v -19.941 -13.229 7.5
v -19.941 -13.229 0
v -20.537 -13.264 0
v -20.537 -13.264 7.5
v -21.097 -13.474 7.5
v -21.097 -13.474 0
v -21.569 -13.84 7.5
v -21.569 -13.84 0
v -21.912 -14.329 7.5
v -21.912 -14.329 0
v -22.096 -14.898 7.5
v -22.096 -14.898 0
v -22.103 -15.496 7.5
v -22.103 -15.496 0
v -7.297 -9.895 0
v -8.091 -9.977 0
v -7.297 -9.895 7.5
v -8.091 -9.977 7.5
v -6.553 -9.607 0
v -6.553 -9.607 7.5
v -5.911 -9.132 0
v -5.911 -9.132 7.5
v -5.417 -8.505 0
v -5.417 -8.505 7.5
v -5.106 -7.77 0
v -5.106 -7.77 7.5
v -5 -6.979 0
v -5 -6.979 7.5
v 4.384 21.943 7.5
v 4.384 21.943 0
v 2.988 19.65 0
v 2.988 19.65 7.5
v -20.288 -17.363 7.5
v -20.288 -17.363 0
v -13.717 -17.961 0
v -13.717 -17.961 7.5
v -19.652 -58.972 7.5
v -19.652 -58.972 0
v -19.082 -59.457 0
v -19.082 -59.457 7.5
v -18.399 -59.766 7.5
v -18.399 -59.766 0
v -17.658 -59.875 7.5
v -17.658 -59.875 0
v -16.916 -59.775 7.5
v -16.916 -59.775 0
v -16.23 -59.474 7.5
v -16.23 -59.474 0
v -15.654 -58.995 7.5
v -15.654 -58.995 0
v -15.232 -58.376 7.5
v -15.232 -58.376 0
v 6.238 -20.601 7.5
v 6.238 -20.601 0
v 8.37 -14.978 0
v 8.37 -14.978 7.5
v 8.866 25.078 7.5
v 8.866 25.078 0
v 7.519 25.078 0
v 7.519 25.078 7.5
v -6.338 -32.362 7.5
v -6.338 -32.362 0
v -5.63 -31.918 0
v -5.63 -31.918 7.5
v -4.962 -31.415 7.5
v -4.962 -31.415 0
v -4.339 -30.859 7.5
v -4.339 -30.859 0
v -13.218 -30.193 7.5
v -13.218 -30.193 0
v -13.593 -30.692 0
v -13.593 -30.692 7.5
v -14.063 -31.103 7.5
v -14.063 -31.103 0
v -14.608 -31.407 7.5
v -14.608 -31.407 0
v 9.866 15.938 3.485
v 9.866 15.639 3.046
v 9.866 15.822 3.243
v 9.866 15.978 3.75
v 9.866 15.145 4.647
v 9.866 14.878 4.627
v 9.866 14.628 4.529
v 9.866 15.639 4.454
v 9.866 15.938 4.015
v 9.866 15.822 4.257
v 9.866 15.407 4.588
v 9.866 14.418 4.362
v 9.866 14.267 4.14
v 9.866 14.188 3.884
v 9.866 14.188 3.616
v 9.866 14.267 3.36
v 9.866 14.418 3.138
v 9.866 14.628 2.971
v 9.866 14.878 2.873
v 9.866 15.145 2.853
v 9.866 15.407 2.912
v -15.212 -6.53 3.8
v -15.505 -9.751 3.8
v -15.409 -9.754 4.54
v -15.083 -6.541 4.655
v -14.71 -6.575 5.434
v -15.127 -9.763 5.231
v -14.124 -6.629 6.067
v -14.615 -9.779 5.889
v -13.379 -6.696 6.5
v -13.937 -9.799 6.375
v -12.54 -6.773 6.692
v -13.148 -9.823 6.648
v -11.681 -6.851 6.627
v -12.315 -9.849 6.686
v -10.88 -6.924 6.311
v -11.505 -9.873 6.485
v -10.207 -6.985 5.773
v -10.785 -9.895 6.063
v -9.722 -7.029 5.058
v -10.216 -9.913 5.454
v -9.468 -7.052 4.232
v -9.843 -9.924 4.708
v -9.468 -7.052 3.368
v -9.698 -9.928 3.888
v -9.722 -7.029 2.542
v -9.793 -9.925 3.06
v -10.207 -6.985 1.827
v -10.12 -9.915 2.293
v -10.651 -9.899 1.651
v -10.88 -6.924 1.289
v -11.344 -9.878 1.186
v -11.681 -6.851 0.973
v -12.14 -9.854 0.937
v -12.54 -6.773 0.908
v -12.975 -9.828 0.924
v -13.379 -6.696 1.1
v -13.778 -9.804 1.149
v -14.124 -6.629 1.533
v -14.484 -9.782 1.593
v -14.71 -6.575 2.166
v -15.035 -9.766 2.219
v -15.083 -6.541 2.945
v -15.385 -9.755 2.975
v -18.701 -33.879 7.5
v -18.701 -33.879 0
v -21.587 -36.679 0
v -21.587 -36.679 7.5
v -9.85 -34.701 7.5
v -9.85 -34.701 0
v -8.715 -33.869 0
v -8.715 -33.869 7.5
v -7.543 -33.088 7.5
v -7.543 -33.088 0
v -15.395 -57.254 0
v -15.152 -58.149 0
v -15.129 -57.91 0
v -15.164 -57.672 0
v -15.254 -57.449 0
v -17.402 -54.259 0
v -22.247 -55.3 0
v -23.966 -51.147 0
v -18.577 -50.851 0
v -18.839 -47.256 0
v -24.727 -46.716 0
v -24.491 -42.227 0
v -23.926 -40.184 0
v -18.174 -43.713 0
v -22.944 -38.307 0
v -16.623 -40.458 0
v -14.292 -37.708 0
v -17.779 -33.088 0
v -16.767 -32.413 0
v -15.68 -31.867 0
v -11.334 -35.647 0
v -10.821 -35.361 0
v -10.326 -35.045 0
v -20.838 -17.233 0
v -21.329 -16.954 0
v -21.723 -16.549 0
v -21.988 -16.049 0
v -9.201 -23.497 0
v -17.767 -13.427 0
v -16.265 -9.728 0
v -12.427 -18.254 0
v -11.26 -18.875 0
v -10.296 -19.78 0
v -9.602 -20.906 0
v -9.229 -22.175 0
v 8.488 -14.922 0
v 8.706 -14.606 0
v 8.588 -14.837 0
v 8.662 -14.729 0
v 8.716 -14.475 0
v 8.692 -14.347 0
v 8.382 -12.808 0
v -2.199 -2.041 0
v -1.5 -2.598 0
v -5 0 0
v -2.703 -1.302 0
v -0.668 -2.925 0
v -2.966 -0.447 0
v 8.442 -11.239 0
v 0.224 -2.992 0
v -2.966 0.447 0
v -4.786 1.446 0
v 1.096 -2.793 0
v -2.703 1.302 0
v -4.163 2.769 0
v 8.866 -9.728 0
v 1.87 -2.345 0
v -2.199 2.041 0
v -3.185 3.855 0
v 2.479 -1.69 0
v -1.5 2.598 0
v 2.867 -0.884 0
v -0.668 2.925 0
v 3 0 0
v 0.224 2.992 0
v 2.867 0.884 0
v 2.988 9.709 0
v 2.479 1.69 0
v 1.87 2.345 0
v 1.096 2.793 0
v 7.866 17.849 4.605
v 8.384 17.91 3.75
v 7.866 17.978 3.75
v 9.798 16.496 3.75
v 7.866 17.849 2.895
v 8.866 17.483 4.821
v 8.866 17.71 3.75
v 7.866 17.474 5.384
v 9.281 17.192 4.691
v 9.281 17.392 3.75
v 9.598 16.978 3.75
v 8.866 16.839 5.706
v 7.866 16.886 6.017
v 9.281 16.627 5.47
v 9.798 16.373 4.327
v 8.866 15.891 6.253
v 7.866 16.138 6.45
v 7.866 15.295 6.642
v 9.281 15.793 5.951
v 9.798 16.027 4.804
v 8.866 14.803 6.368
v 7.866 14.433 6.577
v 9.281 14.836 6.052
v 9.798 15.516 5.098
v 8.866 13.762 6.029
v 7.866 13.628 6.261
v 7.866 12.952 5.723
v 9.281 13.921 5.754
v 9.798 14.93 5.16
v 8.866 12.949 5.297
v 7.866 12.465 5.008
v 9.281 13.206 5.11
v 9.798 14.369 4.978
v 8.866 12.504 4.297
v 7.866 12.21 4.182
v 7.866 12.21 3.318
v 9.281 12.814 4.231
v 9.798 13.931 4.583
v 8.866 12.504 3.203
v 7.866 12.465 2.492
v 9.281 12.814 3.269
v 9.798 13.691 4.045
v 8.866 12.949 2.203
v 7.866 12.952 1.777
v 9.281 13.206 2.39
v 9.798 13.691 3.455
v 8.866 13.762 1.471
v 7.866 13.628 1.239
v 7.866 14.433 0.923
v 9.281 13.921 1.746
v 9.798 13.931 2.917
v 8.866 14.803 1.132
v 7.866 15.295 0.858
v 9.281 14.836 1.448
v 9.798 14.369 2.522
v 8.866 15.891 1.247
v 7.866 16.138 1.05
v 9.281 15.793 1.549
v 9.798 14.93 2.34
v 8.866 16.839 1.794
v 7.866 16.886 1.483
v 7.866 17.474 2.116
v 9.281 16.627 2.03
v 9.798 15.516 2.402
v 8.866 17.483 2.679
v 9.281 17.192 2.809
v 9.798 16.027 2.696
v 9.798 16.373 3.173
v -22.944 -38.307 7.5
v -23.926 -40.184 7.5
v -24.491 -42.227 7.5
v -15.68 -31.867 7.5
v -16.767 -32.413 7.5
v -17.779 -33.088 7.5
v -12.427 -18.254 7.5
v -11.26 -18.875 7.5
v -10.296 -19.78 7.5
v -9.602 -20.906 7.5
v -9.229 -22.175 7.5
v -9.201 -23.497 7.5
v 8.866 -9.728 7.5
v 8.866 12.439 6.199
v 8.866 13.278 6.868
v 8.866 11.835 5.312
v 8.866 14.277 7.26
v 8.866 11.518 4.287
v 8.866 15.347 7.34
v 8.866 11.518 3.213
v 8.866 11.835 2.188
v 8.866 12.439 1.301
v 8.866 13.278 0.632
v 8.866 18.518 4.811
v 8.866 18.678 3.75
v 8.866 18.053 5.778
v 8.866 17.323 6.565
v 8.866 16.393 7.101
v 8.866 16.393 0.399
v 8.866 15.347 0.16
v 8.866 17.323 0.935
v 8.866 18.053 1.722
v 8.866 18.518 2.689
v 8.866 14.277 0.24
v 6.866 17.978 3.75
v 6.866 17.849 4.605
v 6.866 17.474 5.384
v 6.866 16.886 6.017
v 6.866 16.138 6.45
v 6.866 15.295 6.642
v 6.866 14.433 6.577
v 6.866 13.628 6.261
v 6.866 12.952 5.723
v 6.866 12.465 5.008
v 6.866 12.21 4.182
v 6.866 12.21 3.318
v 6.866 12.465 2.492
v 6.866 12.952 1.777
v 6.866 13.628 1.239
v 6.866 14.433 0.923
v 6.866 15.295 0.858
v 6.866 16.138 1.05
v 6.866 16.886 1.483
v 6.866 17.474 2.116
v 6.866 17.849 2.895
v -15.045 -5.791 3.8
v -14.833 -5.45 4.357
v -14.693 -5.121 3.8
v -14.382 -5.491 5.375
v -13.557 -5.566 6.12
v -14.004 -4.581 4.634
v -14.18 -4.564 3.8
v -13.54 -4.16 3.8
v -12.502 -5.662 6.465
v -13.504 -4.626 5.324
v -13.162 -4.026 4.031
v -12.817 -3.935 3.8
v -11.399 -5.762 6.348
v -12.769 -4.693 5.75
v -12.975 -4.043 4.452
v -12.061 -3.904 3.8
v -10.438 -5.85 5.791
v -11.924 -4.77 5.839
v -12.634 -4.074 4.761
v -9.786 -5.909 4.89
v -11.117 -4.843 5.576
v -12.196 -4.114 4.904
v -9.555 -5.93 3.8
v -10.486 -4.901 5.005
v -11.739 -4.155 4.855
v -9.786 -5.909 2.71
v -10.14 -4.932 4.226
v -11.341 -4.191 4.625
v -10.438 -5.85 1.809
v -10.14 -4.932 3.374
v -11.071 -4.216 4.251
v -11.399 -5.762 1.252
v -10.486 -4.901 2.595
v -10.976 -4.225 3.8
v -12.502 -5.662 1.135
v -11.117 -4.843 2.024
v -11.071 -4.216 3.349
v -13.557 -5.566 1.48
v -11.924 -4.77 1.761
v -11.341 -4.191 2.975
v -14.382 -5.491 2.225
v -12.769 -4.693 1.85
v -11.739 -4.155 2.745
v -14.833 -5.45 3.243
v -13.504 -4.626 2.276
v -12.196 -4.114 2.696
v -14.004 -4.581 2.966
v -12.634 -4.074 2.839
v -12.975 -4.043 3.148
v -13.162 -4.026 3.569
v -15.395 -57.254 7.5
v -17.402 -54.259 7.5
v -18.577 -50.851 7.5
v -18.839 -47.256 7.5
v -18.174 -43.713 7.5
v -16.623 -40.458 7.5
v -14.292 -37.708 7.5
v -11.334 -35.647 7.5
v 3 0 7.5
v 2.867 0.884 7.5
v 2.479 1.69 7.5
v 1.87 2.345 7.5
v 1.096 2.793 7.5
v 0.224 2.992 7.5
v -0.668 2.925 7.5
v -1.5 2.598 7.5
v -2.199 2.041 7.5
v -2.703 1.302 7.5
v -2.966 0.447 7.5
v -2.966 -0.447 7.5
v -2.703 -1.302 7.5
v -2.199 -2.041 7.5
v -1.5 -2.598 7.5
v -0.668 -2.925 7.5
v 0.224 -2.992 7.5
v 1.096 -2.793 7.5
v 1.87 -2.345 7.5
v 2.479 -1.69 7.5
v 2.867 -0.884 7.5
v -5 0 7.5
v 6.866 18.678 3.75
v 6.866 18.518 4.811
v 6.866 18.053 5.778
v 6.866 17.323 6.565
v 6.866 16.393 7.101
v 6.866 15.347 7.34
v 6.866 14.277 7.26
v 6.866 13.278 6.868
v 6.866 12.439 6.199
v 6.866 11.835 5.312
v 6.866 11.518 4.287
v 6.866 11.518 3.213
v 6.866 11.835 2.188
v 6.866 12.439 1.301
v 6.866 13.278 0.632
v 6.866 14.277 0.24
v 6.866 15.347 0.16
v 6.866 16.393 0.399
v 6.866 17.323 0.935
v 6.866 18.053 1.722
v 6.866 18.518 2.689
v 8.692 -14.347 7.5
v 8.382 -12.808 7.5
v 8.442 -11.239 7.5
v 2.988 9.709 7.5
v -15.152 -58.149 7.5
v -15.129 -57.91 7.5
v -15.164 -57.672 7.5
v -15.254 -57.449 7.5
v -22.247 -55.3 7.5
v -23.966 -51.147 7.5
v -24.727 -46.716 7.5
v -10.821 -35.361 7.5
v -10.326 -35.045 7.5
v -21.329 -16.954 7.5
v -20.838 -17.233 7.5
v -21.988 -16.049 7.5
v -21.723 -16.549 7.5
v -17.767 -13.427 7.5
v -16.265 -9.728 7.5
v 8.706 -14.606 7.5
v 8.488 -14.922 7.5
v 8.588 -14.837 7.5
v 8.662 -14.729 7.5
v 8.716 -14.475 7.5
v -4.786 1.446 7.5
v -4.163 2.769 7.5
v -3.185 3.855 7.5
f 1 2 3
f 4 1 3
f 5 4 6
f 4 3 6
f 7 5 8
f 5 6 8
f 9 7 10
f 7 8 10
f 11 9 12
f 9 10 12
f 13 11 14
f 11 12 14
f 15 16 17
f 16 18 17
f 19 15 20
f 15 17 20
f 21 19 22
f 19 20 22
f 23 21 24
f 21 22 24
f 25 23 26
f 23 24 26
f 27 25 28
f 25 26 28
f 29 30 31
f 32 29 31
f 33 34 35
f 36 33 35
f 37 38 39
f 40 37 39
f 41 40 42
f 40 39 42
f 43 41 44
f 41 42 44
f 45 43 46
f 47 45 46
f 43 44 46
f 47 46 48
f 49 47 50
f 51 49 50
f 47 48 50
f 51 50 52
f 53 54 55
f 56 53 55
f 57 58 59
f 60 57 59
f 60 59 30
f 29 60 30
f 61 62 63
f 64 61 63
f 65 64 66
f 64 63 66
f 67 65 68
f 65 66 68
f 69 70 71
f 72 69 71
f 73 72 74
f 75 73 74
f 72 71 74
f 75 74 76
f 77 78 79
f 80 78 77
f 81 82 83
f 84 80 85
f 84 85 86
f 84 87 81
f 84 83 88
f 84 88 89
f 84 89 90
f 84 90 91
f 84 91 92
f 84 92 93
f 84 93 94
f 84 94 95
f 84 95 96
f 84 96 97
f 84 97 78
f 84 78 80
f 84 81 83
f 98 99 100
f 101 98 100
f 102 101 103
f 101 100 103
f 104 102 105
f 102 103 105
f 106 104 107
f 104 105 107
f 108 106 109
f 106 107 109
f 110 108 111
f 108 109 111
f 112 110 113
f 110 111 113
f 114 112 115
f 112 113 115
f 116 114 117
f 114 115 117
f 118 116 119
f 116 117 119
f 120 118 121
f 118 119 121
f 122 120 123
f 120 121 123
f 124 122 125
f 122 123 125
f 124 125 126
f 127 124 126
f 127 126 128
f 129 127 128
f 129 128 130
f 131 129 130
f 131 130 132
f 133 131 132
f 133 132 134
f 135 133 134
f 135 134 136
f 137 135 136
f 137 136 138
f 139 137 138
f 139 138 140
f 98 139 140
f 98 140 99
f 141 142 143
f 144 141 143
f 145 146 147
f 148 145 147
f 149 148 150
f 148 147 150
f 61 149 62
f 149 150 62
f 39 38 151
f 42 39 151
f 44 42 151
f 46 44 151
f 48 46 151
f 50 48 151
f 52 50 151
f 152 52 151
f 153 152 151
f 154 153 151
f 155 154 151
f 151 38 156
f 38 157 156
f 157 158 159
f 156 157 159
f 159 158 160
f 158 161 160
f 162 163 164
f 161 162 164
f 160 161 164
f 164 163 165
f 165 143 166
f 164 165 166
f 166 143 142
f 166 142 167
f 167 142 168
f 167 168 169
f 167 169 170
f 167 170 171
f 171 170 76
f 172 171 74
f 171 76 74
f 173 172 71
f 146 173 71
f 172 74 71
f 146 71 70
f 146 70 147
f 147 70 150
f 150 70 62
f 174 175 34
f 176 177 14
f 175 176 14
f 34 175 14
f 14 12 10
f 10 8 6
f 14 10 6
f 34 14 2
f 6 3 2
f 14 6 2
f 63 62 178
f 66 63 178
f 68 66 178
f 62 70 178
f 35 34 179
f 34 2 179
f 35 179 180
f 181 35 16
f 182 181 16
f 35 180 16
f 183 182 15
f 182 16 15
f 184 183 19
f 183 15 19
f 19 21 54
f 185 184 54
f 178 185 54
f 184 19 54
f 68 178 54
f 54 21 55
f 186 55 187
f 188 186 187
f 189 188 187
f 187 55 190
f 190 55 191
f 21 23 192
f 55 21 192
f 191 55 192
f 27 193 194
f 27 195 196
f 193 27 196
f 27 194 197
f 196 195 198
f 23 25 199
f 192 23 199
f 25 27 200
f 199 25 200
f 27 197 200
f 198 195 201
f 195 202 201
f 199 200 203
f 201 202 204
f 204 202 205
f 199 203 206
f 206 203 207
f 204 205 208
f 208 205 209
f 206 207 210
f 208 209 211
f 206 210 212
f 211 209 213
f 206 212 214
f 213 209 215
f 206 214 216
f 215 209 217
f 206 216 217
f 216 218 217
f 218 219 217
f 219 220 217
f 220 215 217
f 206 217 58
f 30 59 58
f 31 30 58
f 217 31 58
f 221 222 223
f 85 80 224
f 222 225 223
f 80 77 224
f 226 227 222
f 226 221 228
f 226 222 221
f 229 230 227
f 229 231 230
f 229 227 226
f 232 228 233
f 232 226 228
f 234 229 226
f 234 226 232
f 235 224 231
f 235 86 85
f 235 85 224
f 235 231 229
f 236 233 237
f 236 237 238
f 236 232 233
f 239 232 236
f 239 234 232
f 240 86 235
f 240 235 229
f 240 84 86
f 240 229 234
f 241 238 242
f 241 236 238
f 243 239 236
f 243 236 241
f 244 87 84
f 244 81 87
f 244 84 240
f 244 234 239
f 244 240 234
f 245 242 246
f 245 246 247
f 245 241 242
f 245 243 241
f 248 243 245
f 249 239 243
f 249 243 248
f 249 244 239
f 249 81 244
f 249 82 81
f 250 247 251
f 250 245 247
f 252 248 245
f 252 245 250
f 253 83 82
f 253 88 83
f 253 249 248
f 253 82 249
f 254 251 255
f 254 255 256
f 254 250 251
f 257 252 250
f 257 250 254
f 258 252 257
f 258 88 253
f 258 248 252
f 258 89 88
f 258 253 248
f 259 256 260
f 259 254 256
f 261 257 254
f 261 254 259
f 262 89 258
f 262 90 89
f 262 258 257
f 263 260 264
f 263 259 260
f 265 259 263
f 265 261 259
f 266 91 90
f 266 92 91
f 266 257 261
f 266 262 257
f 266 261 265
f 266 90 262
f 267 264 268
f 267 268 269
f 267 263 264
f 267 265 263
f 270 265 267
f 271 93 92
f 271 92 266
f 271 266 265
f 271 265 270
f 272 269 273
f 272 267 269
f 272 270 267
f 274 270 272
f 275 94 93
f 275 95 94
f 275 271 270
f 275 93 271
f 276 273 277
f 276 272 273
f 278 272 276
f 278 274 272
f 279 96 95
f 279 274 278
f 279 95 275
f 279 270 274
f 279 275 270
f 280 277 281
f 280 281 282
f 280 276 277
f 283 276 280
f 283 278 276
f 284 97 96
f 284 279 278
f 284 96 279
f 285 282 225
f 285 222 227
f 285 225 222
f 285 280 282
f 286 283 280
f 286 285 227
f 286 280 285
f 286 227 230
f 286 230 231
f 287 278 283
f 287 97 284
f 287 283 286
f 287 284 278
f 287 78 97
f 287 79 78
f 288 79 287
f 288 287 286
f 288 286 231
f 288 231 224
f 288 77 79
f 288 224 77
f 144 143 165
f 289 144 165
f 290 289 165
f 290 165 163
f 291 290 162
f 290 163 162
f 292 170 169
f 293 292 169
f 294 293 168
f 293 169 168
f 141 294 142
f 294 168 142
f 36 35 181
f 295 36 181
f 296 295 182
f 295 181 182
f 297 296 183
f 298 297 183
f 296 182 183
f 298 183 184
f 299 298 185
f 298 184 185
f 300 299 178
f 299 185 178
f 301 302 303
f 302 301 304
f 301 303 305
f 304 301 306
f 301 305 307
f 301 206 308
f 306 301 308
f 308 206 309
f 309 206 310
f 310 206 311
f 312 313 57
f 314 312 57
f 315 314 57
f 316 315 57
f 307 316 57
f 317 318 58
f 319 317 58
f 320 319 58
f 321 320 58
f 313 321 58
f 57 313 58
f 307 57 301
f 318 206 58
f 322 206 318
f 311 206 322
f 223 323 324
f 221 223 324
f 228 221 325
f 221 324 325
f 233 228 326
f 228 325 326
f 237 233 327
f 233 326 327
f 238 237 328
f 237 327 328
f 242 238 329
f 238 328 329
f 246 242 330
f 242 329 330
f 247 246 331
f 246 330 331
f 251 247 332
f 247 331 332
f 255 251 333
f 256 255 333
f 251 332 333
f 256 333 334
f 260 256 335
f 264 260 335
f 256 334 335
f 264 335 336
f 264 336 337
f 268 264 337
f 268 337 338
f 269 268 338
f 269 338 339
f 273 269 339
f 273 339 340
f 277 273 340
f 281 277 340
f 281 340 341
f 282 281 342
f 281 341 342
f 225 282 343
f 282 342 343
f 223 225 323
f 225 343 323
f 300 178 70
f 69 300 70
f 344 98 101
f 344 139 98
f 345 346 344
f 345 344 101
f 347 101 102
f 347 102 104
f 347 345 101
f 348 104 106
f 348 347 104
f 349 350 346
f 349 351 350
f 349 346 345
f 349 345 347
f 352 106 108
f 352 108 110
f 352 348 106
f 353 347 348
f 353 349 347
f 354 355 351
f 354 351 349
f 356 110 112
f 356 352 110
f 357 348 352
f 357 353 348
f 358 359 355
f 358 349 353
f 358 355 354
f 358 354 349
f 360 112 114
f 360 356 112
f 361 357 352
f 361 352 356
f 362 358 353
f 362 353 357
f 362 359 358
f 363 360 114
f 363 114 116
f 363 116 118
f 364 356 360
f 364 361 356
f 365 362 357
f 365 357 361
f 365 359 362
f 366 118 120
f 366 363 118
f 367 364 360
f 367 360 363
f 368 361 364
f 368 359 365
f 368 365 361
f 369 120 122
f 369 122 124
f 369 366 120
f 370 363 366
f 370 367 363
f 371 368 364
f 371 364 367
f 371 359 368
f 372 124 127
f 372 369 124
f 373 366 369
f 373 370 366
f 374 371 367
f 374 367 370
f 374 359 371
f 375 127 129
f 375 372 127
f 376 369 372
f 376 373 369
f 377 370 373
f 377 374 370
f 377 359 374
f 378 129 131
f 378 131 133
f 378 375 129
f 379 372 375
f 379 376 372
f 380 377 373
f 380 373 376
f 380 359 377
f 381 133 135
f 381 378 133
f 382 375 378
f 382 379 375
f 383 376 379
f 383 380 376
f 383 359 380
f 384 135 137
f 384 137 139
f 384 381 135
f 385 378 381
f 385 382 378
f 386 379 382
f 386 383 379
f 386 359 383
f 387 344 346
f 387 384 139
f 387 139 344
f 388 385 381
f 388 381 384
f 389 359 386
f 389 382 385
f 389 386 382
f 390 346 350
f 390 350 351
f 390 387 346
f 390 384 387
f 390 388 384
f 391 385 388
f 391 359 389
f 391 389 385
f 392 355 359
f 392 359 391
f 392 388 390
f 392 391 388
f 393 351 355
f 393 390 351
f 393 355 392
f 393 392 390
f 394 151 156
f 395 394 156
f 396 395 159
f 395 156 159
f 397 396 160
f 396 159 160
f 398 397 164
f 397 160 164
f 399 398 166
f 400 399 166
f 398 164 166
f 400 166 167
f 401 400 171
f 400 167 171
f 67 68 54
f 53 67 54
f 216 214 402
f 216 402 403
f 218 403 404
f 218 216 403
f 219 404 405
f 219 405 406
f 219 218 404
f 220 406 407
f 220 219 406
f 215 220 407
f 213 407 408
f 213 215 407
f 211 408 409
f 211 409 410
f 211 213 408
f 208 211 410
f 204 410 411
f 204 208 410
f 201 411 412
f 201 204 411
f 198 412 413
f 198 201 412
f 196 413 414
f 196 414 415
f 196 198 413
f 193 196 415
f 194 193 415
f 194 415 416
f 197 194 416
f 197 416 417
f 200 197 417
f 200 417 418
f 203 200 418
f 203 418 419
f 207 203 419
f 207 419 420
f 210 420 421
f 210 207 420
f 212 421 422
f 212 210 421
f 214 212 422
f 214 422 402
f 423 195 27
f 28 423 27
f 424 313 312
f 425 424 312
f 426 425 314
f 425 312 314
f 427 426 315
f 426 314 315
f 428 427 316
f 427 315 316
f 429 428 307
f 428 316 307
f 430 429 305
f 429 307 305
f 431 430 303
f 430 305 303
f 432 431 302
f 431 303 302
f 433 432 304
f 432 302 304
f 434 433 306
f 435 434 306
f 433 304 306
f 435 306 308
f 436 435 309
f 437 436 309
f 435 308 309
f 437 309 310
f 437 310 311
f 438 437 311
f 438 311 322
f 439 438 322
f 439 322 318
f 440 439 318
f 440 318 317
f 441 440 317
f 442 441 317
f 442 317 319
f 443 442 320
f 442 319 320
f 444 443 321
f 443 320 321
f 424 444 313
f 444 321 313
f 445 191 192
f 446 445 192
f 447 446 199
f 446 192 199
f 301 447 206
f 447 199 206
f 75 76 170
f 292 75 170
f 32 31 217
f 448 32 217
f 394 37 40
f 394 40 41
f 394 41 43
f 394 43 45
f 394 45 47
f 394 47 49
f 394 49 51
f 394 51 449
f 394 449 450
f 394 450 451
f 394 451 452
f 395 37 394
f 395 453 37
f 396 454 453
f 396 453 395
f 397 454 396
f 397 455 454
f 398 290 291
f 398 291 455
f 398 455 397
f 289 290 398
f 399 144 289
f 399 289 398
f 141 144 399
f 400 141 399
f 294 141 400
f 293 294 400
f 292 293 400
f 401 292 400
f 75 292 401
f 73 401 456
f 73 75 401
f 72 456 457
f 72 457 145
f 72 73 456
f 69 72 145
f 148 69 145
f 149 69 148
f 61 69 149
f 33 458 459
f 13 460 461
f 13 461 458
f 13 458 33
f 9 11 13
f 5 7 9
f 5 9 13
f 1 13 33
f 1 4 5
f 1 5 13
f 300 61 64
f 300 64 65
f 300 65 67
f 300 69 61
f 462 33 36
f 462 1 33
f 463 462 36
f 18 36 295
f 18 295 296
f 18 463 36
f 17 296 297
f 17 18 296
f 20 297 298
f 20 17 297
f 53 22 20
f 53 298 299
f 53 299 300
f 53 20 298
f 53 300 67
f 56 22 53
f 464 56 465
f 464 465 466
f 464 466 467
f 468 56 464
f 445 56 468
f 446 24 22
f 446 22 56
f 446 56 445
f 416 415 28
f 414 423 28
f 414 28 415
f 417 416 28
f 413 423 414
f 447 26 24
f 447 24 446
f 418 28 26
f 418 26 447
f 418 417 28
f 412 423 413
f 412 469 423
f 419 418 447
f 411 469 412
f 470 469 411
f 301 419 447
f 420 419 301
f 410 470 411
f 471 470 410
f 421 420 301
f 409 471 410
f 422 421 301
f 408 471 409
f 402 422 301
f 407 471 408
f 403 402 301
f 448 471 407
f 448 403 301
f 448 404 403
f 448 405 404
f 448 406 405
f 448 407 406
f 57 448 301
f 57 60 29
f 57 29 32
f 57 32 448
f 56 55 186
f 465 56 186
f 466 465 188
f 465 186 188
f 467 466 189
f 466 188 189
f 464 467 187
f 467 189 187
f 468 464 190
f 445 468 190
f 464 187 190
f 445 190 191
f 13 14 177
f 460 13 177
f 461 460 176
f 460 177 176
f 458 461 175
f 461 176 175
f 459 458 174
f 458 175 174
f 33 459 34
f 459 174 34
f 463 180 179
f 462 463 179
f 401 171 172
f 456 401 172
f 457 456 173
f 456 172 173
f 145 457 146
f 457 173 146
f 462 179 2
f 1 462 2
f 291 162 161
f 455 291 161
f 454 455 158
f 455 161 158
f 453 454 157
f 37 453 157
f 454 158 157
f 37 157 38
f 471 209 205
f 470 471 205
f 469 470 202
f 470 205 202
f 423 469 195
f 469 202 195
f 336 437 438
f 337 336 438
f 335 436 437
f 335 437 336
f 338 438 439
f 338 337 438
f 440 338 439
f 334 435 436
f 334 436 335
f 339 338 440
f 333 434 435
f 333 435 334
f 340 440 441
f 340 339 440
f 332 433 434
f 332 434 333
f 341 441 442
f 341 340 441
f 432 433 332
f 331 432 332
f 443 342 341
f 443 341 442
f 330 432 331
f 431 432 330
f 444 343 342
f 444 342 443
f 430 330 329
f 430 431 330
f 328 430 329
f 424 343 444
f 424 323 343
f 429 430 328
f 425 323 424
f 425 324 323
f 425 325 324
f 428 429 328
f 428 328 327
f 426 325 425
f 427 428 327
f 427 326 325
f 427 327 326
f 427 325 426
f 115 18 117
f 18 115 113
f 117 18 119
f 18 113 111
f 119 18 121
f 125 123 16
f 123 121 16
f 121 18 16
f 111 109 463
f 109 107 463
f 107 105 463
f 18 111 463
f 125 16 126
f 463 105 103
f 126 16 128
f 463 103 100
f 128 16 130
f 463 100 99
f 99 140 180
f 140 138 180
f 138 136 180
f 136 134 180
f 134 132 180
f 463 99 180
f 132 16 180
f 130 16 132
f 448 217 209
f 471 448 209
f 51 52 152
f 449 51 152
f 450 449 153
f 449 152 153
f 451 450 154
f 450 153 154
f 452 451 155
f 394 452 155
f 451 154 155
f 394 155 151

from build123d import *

# Parameters (mm, degrees)
SKETCH_1_R          = 5
SKETCH_1_R_2        = 3
EXTRUDE_1_DEPTH     = 7.5
SKETCH_2_R          = 3.6
CUT_EXTRUDE_1_DEPTH = 2
SKETCH_3_R          = 2.9
EXTRUDE_2_DEPTH     = 3
FILLET_1_R          = 2
SKETCH_4_R          = 2.9
EXTRUDE_3_DEPTH     = 10
FILLET_2_R          = 2.9
FILLET_3_R          = 3


with BuildPart() as part:
    # 스케치1 → 보스-돌출1 (new body)
    # profile 1 of 5: a face of its own
    with BuildSketch(Plane.XY):
        with BuildLine():
            Line((8.866410343, 21.94338903), (4.384187039, 21.94338903))
            Line((4.384187039, 21.94338903), (2.987768149, 19.65002342))
            Line((2.987768149, 19.65002342), (2.987768149, 17.661246793))
            Line((2.987768149, 17.661246793), (2.987768149, 9.70876495))
            Line((2.987768149, 9.70876495), (-3.184671245, 3.854590647))
            ThreePointArc((-3.184671245, 3.854590647), (2.13033375, 4.523458645), (5, 0))
            ThreePointArc((5, 0), (0, -5), (-5, 0))
            Line((-5, 0), (-5, -10.071407464))
            Line((-5, -10.071407464), (-16.264805165, -9.728236855))
            Line((-16.264805165, -9.728236855), (-17.766639728, -13.42657959))
            Line((-17.766639728, -13.42657959), (-19.940502755, -13.22881584))
            ThreePointArc((-19.940502755, -13.22881584), (-21.568981751, -13.840235901), (-22.102673306, -15.49581787))
            ThreePointArc((-22.102673306, -15.49581787), (-21.54079944, -16.765444299), (-20.287735083, -17.363343312))
            Line((-20.287735083, -17.363343312), (-13.716958703, -17.9611093))
            ThreePointArc((-13.716958703, -17.9611093), (-10.295562947, -19.77999502), (-9.201017746, -23.497018692))
            Line((-9.201017746, -23.497018692), (-13.218080179, -30.193463728))
            ThreePointArc((-13.218080179, -30.193463728), (-13.817495958, -30.9099569), (-14.608237914, -31.407338947))
            Line((-14.608237914, -31.407338947), (-15.680360182, -31.867141901))
            ThreePointArc((-15.680360182, -31.867141901), (-17.282818205, -32.73507756), (-18.70115036, -33.879419256))
            Line((-18.70115036, -33.879419256), (-21.587390027, -36.678865361))
            ThreePointArc((-21.587390027, -36.678865361), (-23.484754079, -39.219572782), (-24.491261067, -42.226585957))
            ThreePointArc((-24.491261067, -42.226585957), (-23.966473892, -51.146683639), (-19.652431958, -58.971808969))
            ThreePointArc((-19.652431958, -58.971808969), (-17.283591849, -59.850561763), (-15.231880476, -58.376082064))
            ThreePointArc((-15.231880476, -58.376082064), (-15.139015744, -57.789610004), (-15.395055283, -57.253870245))
            ThreePointArc((-15.395055283, -57.253870245), (-18.621303847, -45.462540141), (-11.334185384, -35.647141528))
            ThreePointArc((-11.334185384, -35.647141528), (-10.571184727, -35.206851872), (-9.849893086, -34.701121359))
            ThreePointArc((-9.849893086, -34.701121359), (-8.133553397, -33.471894478), (-6.337557558, -32.362291125))
            ThreePointArc((-6.337557558, -32.362291125), (-5.290911527, -31.673468731), (-4.338619501, -30.85916897))
            Line((-4.338619501, -30.85916897), (6.238088337, -20.600518625))
            Line((6.238088337, -20.600518625), (8.3701186, -14.978169718))
            ThreePointArc((8.3701186, -14.978169718), (8.662275884, -14.729272874), (8.69193724, -14.346616734))
            ThreePointArc((8.69193724, -14.346616734), (8.365752146, -12.021808556), (8.866410343, -9.728236855))
            Line((8.866410343, -9.728236855), (8.866410343, 21.94338903))
        make_face()
    # profile 2 of 5: a face of its own
    with BuildSketch(Plane.XY):
        Circle(SKETCH_1_R)
        Circle(SKETCH_1_R_2, mode=Mode.SUBTRACT)
    # profile 3 of 5: a face of its own
    with BuildSketch(Plane.XY):
        with BuildLine():
            ThreePointArc((5, 0), (2.13033375, 4.523458645), (-3.184671245, 3.854590647))
            ThreePointArc((-3.184671245, 3.854590647), (-4.523458645, 2.13033375), (-5, 0))
            ThreePointArc((-5, 0), (0, -5), (5, 0))
        make_face()
        Circle(SKETCH_1_R_2, mode=Mode.SUBTRACT)
    # profile 4 of 5: a face of its own
    with BuildSketch(Plane.XY):
        Polygon((8.866410343, 25.078081763), (7.518879772, 25.078081763), (4.384187039, 21.94338903), (8.866410343, 21.94338903), align=None)
    # profile 5 of 5: a face of its own
    with BuildSketch(Plane.XY):
        with BuildLine():
            Line((8.866410343, 21.94338903), (4.384187039, 21.94338903))
            Line((4.384187039, 21.94338903), (2.987768149, 19.65002342))
            Line((2.987768149, 19.65002342), (2.987768149, 17.661246793))
            Line((2.987768149, 17.661246793), (2.987768149, 9.70876495))
            Line((2.987768149, 9.70876495), (-3.184671245, 3.854590647))
            ThreePointArc((-3.184671245, 3.854590647), (2.13033375, 4.523458645), (5, 0))
            ThreePointArc((5, 0), (0, -5), (-5, 0))
            Line((-5, 0), (-5, -10.071407464))
            Line((-5, -10.071407464), (-16.264805165, -9.728236855))
            Line((-16.264805165, -9.728236855), (-17.766639728, -13.42657959))
            Line((-17.766639728, -13.42657959), (-19.940502755, -13.22881584))
            ThreePointArc((-19.940502755, -13.22881584), (-21.568981751, -13.840235901), (-22.102673306, -15.49581787))
            ThreePointArc((-22.102673306, -15.49581787), (-21.54079944, -16.765444299), (-20.287735083, -17.363343312))
            Line((-20.287735083, -17.363343312), (-13.716958703, -17.9611093))
            ThreePointArc((-13.716958703, -17.9611093), (-10.295562947, -19.77999502), (-9.201017746, -23.497018692))
            Line((-9.201017746, -23.497018692), (-13.218080179, -30.193463728))
            ThreePointArc((-13.218080179, -30.193463728), (-13.817495958, -30.9099569), (-14.608237914, -31.407338947))
            Line((-14.608237914, -31.407338947), (-15.680360182, -31.867141901))
            ThreePointArc((-15.680360182, -31.867141901), (-17.282818205, -32.73507756), (-18.70115036, -33.879419256))
            Line((-18.70115036, -33.879419256), (-21.587390027, -36.678865361))
            ThreePointArc((-21.587390027, -36.678865361), (-23.484754079, -39.219572782), (-24.491261067, -42.226585957))
            ThreePointArc((-24.491261067, -42.226585957), (-23.966473892, -51.146683639), (-19.652431958, -58.971808969))
            ThreePointArc((-19.652431958, -58.971808969), (-17.283591849, -59.850561763), (-15.231880476, -58.376082064))
            ThreePointArc((-15.231880476, -58.376082064), (-15.139015744, -57.789610004), (-15.395055283, -57.253870245))
            ThreePointArc((-15.395055283, -57.253870245), (-18.621303847, -45.462540141), (-11.334185384, -35.647141528))
            ThreePointArc((-11.334185384, -35.647141528), (-10.571184727, -35.206851872), (-9.849893086, -34.701121359))
            ThreePointArc((-9.849893086, -34.701121359), (-8.133553397, -33.471894478), (-6.337557558, -32.362291125))
            ThreePointArc((-6.337557558, -32.362291125), (-5.290911527, -31.673468731), (-4.338619501, -30.85916897))
            Line((-4.338619501, -30.85916897), (6.238088337, -20.600518625))
            Line((6.238088337, -20.600518625), (8.3701186, -14.978169718))
            ThreePointArc((8.3701186, -14.978169718), (8.662275884, -14.729272874), (8.69193724, -14.346616734))
            ThreePointArc((8.69193724, -14.346616734), (8.365752146, -12.021808556), (8.866410343, -9.728236855))
            Line((8.866410343, -9.728236855), (8.866410343, 21.94338903))
        make_face()
    extrude(amount=EXTRUDE_1_DEPTH)

    # 스케치2 → 컷-돌출1 (cut)
    with BuildSketch(Plane(origin=(8.866410343, 0, 0), x_dir=(0, 0, -1), z_dir=(1, 0, 0))):
        with Locations(Location((-3.75, 15.078081763, 0), (0, 0, 90))):
            Circle(SKETCH_2_R)
    extrude(amount=-CUT_EXTRUDE_1_DEPTH, mode=Mode.SUBTRACT)

    # 스케치3 → 보스-돌출2 (add)
    with BuildSketch(Plane(origin=(6.866410343, 0, 0), x_dir=(0, 0, -1), z_dir=(1, 0, 0))):
        with Locations(Location((-3.75, 15.078081763, 0), (0, 0, 90))):
            Circle(SKETCH_3_R)
    extrude(amount=EXTRUDE_2_DEPTH)

    # 필렛1
    fillet_1_edges = [part.edges().sort_by_distance(p)[0] for p in [
        (9.866410343, 12.178081763, 3.75),
    ]]
    fillet(fillet_1_edges, radius=FILLET_1_R)

    # 스케치4 → 보스-돌출3 (add)
    with BuildSketch(Plane(origin=(-1.357268469, -14.919396185, 0), x_dir=(0.995887428286197, -0.09059928355955607, 0), z_dir=(0.09059928355955607, 0.995887428286197, 0))):
        with Locations(Location((-11.657618139, -3.8, 0), (0, 0, 180))):
            Circle(SKETCH_4_R)
    extrude(amount=EXTRUDE_3_DEPTH)

    # 필렛2
    fillet_2_edges = [part.edges().sort_by_distance(p)[0] for p in [
        (-9.17287744, -4.167087973, 3.8),
    ]]
    fillet(fillet_2_edges, radius=FILLET_2_R)

    # 필렛3
    fillet_3_edges = [part.edges().sort_by_distance(p)[0] for p in [
        (-5, -10.071407464, 3.75),
    ]]
    fillet(fillet_3_edges, radius=FILLET_3_R)


solid = part.part
